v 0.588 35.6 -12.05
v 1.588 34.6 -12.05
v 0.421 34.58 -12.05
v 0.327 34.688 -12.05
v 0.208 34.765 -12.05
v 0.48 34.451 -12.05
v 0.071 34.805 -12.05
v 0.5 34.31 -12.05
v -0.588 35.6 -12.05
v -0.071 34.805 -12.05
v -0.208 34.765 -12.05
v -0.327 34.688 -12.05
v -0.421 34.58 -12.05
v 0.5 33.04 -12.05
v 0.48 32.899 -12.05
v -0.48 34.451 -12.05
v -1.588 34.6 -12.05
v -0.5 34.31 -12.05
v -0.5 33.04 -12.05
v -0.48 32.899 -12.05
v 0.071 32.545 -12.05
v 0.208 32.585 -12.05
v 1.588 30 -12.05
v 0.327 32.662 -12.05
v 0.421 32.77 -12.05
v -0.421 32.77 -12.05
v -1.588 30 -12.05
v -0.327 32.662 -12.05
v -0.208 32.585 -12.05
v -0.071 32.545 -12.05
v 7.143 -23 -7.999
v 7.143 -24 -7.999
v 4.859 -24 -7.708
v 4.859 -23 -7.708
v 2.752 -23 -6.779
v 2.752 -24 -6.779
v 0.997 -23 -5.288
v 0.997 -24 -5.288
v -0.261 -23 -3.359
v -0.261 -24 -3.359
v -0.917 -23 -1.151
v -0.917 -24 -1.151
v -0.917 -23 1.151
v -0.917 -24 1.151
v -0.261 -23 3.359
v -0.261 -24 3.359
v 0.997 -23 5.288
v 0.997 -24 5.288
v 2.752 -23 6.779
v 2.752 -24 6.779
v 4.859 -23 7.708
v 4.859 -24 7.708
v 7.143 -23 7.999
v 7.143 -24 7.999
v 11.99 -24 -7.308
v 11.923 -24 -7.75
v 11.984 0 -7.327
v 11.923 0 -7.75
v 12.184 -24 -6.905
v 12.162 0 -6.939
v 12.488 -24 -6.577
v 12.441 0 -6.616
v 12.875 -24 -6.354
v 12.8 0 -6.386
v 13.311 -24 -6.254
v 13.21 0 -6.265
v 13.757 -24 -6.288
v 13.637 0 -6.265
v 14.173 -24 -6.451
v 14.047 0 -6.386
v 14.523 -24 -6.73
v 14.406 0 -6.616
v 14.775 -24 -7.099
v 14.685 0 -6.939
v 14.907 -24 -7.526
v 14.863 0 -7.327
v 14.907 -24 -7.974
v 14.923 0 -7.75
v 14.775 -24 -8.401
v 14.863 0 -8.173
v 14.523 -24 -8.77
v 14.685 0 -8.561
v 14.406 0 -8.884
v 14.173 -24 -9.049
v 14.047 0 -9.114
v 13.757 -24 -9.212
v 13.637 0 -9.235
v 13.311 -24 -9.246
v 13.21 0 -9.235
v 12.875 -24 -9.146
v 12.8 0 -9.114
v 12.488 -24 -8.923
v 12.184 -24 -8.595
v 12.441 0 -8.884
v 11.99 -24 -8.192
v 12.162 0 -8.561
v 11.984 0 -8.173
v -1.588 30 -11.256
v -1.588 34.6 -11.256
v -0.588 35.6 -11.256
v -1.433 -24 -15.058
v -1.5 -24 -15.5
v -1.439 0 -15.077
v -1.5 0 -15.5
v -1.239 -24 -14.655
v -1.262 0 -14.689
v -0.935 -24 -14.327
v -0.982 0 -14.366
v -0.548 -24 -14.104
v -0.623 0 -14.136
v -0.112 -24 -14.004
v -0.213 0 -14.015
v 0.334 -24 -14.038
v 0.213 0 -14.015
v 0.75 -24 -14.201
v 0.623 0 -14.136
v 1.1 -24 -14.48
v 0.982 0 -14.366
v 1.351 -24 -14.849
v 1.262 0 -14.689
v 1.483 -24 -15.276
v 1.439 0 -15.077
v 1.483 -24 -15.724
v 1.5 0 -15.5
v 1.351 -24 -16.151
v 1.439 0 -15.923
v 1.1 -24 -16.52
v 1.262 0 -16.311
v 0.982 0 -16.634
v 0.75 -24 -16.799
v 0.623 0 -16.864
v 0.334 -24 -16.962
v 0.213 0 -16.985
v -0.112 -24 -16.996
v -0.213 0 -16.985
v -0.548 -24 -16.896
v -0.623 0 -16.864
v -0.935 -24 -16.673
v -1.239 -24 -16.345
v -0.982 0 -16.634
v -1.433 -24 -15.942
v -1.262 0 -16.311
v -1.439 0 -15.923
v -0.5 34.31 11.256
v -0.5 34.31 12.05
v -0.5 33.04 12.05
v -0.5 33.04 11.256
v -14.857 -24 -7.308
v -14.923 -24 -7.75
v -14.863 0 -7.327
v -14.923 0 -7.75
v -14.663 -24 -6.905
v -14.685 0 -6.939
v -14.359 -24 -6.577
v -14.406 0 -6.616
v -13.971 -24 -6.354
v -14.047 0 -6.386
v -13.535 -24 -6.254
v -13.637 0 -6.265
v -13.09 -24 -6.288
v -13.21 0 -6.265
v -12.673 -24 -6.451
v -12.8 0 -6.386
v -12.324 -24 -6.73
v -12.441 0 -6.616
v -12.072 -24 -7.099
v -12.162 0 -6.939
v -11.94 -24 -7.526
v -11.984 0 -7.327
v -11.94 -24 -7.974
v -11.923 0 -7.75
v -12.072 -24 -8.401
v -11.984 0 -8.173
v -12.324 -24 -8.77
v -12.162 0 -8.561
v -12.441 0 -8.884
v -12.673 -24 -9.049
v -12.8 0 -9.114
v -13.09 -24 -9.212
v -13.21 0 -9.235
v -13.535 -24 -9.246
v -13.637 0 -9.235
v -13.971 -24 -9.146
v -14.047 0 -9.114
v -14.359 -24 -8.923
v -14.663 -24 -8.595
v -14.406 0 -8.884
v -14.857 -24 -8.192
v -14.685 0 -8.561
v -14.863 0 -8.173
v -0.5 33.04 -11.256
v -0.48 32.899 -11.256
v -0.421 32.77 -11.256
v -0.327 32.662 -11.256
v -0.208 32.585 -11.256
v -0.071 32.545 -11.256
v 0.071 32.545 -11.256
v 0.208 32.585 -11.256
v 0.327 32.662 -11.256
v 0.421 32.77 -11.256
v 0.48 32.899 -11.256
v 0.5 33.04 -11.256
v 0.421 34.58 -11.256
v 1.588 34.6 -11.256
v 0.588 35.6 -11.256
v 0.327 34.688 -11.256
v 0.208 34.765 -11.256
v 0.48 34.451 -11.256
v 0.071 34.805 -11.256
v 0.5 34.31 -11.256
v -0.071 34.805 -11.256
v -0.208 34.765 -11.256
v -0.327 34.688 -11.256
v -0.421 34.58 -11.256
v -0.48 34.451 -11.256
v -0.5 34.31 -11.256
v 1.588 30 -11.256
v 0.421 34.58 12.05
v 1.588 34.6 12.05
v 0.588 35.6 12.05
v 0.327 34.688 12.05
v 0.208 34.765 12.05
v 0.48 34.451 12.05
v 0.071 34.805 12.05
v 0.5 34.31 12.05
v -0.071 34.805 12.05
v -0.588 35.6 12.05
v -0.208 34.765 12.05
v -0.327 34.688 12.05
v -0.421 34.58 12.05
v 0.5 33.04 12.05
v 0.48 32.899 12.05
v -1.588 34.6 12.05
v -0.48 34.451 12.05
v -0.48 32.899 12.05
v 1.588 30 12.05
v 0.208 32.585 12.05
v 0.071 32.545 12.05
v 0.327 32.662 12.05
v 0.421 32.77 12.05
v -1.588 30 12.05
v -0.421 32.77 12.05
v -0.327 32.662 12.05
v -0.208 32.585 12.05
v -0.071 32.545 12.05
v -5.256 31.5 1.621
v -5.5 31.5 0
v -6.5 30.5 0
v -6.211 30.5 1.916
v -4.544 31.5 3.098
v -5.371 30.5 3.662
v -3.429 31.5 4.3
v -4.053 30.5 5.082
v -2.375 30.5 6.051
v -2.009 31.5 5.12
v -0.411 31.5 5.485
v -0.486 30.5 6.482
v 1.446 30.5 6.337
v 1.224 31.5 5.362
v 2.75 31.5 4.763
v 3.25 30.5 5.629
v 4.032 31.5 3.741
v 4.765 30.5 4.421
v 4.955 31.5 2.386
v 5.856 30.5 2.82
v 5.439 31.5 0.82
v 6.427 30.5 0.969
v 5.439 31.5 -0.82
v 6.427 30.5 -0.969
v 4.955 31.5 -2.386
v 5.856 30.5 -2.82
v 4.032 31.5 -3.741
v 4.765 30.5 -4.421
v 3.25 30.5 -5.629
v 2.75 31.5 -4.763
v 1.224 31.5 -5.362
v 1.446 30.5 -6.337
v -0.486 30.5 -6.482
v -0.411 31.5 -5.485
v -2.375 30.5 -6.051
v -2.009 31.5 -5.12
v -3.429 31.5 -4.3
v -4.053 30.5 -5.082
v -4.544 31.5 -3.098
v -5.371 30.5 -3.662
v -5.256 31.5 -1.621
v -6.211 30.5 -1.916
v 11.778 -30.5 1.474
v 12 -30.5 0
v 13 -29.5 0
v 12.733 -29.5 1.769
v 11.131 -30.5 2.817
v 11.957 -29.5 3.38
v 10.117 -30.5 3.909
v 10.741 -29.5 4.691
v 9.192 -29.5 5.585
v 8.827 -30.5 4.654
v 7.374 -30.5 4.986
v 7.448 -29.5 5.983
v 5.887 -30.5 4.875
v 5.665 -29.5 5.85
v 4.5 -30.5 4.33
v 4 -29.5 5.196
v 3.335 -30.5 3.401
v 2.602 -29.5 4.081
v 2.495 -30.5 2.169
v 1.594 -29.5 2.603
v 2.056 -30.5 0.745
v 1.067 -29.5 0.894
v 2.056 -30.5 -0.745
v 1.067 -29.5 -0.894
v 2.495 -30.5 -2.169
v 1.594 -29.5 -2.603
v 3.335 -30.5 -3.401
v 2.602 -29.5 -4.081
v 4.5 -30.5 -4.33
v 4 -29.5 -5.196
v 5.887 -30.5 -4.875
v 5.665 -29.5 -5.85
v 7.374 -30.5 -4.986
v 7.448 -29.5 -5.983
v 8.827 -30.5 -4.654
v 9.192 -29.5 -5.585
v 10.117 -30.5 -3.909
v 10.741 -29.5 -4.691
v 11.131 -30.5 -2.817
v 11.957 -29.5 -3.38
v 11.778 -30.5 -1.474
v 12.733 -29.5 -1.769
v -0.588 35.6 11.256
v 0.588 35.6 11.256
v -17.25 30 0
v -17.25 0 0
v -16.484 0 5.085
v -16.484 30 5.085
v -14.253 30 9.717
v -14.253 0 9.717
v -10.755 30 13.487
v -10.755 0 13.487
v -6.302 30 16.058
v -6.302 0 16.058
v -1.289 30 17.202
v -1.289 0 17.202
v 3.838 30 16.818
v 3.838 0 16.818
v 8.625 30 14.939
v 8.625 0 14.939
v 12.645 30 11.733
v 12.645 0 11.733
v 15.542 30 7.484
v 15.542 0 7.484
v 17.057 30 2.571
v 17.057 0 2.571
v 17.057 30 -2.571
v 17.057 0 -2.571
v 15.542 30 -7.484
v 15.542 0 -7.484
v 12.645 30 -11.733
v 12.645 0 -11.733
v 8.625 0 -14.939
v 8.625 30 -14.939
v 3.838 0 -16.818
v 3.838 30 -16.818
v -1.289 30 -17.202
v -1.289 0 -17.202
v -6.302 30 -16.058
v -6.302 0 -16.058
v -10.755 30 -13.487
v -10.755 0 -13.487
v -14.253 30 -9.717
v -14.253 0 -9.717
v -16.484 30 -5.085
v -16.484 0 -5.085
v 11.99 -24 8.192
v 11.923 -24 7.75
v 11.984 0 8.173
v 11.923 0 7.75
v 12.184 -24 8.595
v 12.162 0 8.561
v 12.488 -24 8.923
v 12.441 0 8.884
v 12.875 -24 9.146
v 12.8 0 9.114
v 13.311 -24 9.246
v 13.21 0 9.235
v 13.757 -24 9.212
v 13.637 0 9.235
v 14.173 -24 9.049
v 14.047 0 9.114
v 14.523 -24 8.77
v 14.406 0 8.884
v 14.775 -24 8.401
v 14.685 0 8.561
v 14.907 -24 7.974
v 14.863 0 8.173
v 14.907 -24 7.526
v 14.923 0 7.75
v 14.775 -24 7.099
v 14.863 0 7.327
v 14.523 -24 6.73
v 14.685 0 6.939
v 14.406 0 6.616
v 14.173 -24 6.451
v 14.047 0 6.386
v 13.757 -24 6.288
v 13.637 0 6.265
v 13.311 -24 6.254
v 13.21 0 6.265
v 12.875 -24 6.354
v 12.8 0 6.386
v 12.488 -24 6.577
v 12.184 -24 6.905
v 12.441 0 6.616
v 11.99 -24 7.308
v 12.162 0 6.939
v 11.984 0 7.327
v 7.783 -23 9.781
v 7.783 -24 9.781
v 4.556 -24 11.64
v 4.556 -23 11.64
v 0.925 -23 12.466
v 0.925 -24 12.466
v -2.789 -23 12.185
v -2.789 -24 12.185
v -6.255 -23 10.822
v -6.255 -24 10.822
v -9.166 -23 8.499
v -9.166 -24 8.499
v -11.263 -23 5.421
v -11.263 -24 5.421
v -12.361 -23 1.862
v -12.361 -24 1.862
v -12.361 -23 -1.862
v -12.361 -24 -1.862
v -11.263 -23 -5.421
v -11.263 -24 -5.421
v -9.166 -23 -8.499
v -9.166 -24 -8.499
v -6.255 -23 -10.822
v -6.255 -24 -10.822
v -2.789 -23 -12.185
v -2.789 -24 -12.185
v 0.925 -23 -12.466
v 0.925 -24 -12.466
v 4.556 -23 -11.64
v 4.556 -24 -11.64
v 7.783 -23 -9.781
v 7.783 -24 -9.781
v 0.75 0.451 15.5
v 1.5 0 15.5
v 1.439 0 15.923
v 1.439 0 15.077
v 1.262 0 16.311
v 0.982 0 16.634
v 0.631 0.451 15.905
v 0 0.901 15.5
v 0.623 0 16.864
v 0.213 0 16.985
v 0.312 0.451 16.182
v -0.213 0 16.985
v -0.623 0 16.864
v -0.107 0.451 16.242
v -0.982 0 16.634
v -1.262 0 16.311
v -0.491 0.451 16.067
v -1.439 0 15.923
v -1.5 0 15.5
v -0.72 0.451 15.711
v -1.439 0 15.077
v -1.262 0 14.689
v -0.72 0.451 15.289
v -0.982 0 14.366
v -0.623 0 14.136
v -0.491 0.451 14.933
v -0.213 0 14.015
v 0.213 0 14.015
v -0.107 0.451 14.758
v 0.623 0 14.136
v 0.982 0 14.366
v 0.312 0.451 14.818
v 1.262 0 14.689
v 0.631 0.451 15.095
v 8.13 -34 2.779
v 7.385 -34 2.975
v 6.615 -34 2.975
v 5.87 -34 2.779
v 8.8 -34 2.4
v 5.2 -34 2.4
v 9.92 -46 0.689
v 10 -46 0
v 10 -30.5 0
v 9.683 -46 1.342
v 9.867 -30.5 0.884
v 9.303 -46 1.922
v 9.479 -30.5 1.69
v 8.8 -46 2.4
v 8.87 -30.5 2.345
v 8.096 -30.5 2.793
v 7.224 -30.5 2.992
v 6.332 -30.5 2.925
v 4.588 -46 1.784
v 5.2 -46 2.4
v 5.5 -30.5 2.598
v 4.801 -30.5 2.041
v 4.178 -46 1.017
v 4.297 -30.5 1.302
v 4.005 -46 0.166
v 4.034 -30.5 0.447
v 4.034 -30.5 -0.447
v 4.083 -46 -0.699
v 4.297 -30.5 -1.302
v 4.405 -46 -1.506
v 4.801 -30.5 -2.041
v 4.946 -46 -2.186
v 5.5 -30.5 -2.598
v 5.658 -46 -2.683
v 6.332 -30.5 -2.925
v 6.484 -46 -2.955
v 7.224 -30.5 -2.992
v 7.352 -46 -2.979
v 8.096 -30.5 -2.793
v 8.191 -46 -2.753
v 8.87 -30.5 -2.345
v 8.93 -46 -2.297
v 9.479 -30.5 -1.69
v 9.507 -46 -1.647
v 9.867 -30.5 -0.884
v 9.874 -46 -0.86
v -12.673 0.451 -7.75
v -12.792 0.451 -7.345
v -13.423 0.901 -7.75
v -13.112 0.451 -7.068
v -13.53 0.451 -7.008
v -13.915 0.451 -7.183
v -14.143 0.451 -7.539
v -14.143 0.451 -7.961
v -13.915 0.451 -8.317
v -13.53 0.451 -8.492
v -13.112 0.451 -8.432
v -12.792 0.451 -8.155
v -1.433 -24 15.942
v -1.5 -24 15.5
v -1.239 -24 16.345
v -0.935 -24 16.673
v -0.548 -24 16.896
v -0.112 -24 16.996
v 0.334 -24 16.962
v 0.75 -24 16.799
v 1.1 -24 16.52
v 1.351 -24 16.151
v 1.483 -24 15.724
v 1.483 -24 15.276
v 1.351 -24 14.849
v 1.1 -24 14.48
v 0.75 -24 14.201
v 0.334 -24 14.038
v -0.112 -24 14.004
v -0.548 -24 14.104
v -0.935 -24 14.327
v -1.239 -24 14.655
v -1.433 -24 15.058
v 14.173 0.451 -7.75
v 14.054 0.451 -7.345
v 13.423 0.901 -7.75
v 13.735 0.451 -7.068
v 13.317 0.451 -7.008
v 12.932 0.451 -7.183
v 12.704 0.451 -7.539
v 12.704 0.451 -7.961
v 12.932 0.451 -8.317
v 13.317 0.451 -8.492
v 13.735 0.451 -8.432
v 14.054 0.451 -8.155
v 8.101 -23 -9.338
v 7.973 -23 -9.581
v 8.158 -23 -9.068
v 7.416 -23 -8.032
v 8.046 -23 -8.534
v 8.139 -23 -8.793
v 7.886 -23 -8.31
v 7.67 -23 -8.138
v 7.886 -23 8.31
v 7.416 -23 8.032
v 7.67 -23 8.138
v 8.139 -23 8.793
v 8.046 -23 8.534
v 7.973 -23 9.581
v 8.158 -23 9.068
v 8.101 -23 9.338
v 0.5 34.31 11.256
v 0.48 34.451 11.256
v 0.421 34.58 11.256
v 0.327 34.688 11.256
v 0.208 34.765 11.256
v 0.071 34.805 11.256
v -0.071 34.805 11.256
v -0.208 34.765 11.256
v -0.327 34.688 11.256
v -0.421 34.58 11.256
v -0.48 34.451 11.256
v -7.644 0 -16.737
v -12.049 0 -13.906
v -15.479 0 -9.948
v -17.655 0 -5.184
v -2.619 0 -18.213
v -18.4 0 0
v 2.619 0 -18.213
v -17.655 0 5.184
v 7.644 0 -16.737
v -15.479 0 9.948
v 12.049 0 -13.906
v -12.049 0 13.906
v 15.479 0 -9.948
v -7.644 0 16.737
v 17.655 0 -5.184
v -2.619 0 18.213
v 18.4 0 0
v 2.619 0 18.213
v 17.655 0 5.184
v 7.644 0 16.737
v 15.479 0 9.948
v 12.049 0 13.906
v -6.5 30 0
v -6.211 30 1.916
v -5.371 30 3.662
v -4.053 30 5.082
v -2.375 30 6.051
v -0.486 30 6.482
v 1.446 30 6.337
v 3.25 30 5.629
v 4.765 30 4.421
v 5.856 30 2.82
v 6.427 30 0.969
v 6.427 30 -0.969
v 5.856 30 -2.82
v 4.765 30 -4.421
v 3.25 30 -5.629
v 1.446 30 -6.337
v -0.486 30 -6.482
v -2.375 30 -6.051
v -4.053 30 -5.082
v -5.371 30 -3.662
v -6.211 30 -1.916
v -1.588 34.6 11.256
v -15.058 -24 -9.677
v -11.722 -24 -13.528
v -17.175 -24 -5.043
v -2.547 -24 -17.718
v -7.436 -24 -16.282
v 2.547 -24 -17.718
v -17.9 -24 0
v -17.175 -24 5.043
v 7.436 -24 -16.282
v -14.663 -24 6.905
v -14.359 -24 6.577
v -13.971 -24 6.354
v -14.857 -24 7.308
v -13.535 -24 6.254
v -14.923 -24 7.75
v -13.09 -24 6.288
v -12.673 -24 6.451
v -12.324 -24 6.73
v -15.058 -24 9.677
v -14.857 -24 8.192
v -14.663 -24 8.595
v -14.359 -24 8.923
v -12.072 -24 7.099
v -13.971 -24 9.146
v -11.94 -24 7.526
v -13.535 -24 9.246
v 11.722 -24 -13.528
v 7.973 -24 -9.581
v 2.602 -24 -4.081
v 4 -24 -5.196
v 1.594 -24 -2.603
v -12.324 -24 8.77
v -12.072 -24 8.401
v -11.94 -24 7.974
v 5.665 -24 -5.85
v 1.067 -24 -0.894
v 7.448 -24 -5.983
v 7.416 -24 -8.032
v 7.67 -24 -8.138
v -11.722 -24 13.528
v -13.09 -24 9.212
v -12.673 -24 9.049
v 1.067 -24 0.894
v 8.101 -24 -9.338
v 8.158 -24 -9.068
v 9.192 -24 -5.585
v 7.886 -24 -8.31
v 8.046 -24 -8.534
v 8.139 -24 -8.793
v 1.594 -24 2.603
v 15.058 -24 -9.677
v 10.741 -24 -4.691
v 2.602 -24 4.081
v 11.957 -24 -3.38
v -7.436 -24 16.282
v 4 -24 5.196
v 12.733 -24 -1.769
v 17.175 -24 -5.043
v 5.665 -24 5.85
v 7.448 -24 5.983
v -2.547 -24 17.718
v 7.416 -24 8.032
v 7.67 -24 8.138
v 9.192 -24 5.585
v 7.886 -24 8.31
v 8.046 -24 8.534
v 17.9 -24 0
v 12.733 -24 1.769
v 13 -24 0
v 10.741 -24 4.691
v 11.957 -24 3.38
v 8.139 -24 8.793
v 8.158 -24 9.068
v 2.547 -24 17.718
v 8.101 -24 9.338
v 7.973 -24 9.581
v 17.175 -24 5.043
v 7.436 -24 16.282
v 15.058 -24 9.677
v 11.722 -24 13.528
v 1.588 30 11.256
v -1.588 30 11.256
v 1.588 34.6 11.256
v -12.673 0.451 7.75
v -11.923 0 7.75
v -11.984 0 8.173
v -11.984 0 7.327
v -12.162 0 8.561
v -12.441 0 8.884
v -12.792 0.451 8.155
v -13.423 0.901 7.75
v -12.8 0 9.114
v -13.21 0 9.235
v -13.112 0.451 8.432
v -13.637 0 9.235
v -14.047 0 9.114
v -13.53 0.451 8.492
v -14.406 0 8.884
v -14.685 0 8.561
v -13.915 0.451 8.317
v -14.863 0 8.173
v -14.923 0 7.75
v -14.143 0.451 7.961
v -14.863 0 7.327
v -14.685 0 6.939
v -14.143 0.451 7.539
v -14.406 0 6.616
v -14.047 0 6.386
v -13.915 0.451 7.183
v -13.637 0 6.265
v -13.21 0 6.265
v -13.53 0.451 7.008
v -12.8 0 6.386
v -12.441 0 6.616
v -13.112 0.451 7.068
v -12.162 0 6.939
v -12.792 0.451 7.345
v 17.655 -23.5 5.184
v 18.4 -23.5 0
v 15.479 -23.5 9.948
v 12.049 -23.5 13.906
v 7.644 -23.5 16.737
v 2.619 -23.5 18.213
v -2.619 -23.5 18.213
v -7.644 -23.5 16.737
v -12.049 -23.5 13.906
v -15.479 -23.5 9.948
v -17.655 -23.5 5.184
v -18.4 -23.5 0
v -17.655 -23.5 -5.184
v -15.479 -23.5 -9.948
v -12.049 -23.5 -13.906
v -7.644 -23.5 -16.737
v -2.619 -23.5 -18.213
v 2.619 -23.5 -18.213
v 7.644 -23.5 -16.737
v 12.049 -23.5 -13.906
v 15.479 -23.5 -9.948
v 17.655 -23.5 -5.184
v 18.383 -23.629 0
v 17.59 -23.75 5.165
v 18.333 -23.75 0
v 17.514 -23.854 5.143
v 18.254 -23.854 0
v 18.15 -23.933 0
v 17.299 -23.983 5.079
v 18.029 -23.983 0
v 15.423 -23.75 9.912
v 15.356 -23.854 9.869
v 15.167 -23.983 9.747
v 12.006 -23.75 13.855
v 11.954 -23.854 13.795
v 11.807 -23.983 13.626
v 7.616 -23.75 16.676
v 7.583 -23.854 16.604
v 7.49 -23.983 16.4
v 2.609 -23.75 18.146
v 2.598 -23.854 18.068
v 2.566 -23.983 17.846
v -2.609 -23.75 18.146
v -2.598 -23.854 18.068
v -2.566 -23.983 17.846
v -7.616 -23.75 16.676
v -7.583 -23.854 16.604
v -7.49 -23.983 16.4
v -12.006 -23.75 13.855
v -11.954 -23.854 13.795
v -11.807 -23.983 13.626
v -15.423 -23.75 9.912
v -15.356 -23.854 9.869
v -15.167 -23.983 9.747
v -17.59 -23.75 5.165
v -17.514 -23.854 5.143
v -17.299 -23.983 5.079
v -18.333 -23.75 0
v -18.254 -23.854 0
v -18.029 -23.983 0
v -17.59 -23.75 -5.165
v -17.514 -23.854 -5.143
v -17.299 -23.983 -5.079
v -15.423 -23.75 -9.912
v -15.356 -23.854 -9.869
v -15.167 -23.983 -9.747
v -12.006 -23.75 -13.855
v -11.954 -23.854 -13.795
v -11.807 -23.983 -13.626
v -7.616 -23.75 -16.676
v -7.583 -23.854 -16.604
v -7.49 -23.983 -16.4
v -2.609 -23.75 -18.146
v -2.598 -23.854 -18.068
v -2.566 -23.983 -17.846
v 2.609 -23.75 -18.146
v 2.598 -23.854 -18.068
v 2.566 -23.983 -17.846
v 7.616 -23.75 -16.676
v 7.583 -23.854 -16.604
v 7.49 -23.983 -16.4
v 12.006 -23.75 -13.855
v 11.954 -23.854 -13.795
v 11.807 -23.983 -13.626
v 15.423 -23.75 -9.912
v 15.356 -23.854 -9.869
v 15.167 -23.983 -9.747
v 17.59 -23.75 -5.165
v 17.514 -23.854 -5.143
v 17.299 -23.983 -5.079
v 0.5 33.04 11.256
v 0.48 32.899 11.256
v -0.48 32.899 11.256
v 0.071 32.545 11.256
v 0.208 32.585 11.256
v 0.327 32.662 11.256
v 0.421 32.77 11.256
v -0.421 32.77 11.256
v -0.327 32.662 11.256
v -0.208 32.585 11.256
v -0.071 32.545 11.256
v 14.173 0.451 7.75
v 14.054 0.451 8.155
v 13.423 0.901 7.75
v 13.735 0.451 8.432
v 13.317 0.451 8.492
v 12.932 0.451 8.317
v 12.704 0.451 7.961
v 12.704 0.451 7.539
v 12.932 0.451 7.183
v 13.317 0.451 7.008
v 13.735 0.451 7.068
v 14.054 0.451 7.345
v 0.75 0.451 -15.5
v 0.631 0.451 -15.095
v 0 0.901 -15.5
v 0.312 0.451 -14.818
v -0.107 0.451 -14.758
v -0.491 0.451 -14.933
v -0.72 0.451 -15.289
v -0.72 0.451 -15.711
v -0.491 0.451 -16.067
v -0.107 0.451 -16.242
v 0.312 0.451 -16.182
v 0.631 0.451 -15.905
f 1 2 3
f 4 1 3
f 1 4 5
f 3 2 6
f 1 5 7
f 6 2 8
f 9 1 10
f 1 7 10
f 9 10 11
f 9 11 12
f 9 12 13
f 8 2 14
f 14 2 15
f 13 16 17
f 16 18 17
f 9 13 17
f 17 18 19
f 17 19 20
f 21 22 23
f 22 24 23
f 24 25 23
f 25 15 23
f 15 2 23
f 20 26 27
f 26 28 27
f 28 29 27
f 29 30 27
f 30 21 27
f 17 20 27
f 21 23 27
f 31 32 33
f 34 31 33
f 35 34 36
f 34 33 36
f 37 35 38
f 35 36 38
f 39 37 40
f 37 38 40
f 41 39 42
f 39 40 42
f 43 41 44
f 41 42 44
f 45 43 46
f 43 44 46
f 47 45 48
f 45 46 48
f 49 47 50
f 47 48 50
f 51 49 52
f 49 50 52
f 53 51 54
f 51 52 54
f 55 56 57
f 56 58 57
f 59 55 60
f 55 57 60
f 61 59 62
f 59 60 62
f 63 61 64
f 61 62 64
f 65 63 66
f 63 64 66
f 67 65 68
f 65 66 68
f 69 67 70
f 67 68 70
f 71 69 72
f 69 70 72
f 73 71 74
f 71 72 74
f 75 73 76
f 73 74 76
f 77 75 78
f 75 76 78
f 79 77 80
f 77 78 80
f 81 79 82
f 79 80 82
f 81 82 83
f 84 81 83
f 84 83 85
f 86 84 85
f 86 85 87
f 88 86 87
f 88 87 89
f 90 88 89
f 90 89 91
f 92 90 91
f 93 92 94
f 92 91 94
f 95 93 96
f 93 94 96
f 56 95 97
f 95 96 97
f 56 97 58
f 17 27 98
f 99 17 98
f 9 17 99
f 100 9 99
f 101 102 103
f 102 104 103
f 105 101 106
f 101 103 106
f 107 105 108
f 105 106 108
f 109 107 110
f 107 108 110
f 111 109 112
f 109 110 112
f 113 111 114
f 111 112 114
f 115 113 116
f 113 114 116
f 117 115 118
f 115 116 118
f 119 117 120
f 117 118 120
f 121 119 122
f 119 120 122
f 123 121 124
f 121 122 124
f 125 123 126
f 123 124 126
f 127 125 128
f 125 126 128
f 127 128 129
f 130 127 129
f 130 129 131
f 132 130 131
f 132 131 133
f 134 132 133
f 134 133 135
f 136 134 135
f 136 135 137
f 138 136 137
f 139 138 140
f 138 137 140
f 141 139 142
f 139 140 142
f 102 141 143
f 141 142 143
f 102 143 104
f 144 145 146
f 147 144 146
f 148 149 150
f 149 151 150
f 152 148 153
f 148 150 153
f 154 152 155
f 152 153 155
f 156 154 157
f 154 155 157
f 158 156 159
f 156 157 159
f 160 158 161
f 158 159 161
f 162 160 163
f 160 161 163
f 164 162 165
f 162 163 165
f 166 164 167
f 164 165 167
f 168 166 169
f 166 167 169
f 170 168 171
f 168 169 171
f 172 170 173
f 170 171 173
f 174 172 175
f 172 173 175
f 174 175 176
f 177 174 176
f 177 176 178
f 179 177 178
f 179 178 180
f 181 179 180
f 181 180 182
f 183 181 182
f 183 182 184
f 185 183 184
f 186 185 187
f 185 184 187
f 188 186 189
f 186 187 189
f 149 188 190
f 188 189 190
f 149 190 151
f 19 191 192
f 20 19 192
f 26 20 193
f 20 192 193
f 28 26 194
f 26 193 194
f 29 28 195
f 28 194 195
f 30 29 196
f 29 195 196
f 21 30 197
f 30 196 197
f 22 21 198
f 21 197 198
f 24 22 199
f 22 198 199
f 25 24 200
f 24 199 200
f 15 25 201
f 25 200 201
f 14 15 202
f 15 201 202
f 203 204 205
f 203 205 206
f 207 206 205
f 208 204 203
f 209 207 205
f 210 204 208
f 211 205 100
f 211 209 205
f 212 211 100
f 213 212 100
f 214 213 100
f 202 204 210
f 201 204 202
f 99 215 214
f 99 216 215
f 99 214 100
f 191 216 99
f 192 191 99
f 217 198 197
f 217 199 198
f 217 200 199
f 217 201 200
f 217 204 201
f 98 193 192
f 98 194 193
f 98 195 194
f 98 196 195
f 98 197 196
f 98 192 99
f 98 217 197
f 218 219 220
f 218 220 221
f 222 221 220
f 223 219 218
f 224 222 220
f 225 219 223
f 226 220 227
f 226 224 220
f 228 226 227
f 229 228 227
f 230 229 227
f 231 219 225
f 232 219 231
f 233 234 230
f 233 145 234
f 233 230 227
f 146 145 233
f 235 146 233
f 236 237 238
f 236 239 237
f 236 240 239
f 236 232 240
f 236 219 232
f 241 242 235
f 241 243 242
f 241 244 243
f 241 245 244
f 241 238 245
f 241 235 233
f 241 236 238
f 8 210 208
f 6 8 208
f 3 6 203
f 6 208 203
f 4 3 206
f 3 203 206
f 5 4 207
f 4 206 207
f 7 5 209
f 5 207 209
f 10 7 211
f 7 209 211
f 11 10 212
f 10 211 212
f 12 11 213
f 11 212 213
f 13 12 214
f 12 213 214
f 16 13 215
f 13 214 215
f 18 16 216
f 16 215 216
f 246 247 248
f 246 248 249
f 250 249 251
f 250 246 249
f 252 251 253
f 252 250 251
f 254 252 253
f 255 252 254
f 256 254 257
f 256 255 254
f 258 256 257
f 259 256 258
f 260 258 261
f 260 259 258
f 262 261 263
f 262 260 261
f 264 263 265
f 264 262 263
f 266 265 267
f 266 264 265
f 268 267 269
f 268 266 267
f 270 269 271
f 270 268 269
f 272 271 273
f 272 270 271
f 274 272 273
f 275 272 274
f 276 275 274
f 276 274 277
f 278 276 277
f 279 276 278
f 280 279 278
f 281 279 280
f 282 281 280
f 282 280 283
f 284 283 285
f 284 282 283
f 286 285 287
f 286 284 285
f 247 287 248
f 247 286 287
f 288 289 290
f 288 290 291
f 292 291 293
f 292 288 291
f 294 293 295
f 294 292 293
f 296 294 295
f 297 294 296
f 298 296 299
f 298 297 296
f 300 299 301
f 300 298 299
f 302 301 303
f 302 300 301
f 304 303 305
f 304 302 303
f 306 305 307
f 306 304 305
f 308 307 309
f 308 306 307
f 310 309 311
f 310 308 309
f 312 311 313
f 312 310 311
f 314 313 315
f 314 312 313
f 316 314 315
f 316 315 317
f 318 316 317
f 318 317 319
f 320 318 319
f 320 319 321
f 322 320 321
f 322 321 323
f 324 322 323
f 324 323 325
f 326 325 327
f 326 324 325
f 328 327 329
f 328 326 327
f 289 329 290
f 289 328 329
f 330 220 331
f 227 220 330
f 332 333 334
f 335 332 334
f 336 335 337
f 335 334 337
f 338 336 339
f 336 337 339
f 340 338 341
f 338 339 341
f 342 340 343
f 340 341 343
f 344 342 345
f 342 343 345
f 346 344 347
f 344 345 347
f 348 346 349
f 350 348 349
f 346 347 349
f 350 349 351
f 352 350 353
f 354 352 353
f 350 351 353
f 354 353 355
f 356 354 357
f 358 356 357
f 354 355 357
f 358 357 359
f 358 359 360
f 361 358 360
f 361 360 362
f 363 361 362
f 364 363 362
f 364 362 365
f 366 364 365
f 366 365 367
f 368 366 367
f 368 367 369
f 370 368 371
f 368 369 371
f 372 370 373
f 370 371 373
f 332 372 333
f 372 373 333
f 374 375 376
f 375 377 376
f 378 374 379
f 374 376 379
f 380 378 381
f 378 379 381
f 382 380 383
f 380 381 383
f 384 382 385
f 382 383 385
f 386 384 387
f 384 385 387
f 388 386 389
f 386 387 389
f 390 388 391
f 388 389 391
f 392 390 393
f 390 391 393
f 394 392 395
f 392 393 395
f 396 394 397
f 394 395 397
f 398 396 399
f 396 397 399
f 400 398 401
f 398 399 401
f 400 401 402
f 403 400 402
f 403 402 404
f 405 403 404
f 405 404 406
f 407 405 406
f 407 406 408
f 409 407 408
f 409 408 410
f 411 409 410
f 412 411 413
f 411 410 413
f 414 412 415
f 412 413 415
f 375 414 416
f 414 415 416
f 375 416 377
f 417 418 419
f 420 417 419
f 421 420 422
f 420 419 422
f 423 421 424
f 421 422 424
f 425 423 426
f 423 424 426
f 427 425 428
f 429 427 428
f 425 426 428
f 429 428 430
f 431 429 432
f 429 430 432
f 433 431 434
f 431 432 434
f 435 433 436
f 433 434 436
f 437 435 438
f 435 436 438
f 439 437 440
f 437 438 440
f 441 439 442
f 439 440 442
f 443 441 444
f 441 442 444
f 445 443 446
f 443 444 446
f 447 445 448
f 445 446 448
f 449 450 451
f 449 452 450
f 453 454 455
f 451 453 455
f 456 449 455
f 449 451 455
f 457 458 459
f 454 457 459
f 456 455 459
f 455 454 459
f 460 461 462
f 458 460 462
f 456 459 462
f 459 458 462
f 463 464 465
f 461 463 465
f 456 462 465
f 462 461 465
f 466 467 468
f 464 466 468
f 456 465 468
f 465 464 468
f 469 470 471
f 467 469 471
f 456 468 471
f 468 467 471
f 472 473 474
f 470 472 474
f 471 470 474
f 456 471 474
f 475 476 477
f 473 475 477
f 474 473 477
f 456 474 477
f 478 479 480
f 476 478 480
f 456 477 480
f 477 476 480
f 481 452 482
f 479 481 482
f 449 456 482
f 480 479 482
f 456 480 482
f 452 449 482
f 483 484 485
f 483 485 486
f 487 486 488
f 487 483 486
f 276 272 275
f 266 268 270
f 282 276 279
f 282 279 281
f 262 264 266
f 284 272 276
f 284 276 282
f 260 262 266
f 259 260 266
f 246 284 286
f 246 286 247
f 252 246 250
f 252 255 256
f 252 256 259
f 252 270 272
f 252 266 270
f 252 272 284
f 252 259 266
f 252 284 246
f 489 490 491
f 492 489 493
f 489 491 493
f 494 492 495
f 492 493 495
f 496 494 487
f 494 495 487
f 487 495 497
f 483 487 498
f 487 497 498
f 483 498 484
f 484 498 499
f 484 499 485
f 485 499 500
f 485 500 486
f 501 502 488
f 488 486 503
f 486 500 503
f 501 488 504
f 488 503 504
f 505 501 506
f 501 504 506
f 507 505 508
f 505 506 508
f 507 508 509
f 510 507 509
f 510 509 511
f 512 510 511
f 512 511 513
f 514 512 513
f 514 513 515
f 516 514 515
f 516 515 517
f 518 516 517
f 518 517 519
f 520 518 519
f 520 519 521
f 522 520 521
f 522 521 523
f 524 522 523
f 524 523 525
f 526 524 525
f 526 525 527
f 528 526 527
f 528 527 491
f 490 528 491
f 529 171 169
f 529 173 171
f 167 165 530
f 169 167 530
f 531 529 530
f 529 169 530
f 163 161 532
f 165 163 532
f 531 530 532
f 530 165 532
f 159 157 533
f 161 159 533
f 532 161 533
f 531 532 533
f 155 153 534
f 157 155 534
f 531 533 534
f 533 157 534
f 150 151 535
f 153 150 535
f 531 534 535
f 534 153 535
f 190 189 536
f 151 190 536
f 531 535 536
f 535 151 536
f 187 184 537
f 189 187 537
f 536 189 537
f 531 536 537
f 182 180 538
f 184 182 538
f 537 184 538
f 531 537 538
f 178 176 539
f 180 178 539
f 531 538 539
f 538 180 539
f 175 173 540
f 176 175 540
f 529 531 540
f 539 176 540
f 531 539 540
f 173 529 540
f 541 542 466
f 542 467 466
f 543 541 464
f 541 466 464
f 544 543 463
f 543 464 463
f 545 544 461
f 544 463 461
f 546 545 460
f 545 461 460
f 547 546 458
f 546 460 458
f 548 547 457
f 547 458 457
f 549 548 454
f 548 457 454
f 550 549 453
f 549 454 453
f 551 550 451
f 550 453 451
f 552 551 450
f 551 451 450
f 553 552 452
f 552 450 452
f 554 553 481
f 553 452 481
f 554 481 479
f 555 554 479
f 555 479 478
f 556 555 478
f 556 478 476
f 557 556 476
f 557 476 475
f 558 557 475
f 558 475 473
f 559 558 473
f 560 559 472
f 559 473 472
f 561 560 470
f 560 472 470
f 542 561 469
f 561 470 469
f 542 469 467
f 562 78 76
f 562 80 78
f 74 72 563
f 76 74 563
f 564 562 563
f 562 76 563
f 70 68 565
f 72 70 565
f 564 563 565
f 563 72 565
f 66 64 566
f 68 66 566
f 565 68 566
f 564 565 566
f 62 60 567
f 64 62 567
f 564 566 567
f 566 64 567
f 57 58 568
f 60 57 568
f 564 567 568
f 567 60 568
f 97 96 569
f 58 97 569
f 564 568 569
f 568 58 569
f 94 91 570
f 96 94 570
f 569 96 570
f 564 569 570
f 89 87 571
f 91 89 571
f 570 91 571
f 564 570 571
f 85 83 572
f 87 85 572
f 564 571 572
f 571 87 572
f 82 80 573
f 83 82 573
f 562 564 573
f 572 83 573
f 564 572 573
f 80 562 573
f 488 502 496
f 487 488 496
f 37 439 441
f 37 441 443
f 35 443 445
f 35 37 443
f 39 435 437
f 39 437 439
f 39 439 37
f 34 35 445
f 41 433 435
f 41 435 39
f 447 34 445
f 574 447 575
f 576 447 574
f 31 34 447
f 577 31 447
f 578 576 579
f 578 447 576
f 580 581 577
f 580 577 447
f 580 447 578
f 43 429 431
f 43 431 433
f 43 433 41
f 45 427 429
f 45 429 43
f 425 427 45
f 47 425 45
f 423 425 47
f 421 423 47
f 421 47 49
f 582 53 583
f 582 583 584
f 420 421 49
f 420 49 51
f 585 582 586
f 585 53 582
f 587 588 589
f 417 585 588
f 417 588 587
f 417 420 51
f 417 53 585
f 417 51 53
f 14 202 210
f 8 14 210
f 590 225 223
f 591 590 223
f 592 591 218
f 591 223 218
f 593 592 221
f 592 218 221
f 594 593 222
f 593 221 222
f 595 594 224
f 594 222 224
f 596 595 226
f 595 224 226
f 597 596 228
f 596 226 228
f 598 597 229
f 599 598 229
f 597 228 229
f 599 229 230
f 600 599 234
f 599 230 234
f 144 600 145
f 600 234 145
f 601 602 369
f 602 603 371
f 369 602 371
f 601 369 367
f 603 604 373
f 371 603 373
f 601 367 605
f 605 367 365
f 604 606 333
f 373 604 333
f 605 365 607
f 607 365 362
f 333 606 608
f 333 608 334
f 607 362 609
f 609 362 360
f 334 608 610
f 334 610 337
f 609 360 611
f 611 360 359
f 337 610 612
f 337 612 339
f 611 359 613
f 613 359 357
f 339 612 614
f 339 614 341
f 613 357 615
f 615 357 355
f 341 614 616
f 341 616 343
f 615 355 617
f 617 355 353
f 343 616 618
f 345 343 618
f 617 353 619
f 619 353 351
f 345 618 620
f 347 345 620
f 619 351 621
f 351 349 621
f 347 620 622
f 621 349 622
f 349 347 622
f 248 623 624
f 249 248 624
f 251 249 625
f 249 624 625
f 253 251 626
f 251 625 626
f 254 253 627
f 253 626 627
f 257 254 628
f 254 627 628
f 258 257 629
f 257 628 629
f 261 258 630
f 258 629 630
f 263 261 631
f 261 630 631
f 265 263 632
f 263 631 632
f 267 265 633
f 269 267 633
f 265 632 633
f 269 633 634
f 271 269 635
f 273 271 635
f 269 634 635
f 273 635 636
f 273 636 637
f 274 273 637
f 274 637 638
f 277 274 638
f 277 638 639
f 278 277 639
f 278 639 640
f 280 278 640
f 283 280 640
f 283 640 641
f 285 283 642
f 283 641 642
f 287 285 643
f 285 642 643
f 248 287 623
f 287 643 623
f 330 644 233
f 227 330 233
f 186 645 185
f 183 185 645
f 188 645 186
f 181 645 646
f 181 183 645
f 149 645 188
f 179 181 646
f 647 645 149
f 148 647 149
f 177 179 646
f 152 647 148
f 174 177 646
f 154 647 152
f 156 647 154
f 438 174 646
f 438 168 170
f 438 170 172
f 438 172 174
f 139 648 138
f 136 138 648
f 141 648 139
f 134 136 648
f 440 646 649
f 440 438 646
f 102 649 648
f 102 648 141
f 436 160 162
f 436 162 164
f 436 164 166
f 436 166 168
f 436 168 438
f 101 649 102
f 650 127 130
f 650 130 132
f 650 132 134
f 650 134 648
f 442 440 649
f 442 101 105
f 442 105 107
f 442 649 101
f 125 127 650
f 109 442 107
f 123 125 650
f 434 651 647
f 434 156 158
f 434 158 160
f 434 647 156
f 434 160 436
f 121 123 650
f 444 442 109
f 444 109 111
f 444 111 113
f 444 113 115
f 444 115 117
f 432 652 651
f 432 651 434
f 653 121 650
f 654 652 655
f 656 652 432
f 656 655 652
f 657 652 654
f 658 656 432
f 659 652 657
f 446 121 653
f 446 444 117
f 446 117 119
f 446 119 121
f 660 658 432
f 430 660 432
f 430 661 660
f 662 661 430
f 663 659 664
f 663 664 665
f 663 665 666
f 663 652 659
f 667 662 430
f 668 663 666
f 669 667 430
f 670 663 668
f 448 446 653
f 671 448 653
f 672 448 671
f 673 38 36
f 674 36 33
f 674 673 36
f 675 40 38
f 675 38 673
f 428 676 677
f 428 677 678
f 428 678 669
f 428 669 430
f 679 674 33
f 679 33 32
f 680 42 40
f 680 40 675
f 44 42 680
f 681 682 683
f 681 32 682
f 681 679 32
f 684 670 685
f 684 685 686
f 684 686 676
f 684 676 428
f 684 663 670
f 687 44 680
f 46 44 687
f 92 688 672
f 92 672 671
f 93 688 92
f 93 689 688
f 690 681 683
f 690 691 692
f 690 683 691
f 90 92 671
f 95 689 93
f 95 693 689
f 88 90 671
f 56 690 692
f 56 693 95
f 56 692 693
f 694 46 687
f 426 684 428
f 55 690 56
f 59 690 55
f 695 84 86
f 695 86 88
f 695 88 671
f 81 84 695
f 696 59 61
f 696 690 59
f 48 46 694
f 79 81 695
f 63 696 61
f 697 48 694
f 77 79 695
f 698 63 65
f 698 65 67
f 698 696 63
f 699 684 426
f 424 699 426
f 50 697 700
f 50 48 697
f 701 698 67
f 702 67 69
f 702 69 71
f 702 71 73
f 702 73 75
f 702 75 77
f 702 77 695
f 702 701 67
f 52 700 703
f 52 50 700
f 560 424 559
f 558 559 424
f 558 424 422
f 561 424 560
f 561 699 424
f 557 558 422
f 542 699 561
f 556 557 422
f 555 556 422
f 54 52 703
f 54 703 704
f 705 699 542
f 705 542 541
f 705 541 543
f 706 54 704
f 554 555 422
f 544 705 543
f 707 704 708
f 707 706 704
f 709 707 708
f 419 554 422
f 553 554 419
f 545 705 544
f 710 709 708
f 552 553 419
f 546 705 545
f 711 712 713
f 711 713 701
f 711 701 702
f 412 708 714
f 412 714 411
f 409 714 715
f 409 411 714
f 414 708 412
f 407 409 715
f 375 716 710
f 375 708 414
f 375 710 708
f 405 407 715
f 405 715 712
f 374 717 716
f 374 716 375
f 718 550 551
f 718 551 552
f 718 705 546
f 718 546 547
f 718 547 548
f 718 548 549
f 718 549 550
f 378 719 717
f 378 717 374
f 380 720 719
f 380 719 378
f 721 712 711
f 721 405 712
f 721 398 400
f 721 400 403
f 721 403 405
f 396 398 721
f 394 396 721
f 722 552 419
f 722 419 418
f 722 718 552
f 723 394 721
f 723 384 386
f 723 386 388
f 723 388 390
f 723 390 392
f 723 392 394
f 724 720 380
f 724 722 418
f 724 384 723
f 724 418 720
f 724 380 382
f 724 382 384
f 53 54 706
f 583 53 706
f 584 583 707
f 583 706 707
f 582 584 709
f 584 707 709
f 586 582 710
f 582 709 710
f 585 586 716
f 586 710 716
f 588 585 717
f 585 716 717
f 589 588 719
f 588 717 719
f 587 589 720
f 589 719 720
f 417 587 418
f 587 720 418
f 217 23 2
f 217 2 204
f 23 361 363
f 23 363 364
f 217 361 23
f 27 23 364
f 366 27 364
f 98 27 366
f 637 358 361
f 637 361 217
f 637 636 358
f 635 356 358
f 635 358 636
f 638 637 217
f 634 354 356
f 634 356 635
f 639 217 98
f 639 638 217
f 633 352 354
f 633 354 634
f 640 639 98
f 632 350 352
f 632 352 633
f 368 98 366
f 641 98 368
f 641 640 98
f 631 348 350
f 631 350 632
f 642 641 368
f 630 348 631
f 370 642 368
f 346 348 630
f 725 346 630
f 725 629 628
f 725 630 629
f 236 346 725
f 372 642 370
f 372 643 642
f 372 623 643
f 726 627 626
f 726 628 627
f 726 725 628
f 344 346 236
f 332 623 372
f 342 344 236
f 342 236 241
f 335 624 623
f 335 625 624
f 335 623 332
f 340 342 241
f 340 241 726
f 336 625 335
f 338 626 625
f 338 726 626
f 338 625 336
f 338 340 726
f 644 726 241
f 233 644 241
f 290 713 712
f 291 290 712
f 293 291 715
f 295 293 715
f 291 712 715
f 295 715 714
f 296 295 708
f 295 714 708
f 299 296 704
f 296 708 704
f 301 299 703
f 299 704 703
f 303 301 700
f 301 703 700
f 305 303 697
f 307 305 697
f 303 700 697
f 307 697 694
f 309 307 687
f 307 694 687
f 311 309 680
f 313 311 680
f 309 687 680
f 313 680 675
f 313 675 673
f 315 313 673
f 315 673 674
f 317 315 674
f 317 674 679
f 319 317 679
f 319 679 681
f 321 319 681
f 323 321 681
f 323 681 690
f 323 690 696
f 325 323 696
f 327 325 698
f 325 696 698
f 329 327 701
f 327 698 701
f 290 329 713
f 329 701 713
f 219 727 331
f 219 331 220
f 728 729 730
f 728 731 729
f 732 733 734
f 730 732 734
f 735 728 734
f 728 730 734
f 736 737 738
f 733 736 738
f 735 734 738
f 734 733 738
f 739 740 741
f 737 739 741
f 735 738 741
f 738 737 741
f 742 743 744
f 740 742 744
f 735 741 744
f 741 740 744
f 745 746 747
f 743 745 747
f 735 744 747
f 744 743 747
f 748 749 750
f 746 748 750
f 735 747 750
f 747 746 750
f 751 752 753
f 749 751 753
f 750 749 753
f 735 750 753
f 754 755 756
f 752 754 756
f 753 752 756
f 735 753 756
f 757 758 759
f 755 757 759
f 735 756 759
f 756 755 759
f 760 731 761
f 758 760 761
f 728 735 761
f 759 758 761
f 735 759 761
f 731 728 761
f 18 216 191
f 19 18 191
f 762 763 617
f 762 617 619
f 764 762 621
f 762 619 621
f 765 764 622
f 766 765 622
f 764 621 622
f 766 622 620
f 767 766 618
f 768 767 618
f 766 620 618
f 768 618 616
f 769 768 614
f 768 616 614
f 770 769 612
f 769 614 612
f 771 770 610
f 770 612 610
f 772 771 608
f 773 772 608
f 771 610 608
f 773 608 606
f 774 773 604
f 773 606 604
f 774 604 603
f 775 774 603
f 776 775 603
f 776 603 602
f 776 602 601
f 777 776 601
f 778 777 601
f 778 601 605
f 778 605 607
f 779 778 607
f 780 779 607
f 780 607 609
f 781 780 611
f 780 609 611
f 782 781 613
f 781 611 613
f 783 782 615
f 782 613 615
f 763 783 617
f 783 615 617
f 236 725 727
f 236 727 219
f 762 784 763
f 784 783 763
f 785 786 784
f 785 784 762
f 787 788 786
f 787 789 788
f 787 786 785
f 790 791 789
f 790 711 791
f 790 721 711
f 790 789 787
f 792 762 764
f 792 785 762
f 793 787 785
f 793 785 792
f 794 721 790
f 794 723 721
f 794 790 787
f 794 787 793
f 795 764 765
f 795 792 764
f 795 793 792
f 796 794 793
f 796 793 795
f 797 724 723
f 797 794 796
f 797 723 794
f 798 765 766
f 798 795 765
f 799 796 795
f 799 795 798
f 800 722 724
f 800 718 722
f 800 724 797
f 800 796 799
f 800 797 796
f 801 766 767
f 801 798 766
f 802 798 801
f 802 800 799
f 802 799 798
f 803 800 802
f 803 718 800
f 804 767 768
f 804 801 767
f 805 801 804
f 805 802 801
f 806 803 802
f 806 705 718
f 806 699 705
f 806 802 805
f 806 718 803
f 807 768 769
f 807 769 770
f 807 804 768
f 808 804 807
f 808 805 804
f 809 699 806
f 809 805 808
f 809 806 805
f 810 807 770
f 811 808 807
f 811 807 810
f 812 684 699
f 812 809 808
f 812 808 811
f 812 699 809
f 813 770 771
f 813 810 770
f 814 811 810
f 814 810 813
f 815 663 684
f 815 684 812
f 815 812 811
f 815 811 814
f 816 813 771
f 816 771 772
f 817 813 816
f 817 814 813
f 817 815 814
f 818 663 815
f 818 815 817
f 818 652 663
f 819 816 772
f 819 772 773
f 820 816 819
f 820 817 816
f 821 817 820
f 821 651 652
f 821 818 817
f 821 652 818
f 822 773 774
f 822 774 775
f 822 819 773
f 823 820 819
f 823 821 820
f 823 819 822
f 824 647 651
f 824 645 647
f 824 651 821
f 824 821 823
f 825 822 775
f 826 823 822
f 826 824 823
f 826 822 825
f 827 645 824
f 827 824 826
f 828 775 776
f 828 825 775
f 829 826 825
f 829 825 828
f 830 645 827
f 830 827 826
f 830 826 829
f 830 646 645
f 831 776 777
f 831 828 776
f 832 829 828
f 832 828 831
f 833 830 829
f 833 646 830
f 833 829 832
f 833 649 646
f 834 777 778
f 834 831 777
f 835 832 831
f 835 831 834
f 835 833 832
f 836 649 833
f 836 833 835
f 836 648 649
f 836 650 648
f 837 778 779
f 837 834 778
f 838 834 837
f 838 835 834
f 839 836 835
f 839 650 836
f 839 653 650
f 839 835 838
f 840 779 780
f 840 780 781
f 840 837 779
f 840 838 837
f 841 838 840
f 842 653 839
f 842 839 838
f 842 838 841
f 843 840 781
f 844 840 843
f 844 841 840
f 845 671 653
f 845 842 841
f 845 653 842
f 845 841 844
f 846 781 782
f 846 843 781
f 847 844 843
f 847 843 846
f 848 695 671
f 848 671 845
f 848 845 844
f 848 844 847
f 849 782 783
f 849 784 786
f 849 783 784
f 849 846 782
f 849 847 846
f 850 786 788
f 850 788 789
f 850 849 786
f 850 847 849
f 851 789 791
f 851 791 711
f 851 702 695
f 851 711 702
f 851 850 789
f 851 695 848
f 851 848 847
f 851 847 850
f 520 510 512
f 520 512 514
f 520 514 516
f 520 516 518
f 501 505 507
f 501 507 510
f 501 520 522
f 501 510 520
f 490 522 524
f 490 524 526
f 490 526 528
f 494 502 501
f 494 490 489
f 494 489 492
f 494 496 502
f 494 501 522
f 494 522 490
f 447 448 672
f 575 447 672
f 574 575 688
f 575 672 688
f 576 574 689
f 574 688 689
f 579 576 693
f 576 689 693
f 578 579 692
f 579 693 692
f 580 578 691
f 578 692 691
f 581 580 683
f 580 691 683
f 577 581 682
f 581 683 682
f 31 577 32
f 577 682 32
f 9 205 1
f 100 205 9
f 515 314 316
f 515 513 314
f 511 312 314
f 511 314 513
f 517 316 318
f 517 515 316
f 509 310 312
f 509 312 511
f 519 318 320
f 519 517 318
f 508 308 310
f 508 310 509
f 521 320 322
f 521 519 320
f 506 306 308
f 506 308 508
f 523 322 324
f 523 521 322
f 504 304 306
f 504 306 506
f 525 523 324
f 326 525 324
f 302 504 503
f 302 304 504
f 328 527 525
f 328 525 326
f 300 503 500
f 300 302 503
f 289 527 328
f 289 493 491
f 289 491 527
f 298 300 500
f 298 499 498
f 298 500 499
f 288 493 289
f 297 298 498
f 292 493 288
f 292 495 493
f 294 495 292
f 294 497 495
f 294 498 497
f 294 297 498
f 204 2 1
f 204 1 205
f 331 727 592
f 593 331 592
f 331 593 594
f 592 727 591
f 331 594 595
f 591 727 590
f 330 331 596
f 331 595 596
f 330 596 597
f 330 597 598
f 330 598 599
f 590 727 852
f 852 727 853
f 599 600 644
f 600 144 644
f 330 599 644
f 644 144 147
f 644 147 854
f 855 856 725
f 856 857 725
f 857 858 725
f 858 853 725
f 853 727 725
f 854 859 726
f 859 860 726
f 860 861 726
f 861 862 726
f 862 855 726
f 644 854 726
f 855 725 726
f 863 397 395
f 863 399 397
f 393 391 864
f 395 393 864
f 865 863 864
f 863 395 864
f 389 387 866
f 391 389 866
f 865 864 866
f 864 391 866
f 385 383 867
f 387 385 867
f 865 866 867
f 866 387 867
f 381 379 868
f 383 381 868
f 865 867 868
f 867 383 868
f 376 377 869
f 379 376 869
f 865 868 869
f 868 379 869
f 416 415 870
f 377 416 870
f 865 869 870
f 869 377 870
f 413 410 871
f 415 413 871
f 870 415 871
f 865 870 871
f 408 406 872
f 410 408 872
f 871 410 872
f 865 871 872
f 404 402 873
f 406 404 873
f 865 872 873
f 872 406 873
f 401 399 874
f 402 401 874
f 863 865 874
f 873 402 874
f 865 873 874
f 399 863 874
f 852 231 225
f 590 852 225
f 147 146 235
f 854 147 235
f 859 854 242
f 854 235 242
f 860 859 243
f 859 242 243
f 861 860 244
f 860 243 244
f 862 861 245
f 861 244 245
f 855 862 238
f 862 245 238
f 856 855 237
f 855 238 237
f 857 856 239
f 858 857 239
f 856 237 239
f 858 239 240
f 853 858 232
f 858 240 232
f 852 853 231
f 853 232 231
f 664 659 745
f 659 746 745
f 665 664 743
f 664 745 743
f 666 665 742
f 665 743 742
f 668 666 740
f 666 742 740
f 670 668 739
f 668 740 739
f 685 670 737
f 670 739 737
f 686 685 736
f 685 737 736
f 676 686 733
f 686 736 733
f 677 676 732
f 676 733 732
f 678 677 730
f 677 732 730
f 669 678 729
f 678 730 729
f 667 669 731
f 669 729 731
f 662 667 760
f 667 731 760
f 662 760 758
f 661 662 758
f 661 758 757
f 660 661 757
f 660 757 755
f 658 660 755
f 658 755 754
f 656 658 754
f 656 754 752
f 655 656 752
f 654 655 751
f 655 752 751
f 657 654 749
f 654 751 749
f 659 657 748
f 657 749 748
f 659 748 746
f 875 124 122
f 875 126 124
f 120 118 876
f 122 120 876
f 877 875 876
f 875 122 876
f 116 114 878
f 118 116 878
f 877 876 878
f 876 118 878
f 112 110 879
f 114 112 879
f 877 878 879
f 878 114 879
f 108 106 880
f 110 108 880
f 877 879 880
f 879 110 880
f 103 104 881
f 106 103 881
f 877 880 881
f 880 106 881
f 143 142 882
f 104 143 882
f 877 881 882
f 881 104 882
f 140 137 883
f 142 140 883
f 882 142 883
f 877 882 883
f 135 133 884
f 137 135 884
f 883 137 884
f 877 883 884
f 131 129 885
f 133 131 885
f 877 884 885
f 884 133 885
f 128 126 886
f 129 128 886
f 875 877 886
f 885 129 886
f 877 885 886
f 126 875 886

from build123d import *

# Parameters (mm, degrees)
F0_R      = 18.4
F1_DEPTH  = 24
F2_R      = 17.25
F3_DEPTH  = 30
F4_R      = 6
F5_DEPTH  = 6.5
F6_R      = 3
F7_DEPTH  = 15.5
F8_SIZE   = 1
F10_DEPTH = 12
F12_D     = 3
F12_DEPTH = 24
F12_TIP   = 0.9012909285
F14_DEPTH = 1
F15_R     = 6.5
F16_DEPTH = 1.5
F17_SIZE  = 1
F18_W     = 3.175
F18_H     = 0.79375
F19_DEPTH = 5.6
F20_SIZE  = 1
F22_DEPTH = 25.4
F23_R     = 0.5


with BuildPart() as f1:
    # F0 (on Front) → F1 (new body)
    with BuildSketch(Plane.XZ):
        Circle(F0_R)
    extrude(amount=F1_DEPTH)

    # F2 (on face) → F3 (join)
    with BuildSketch(Plane(origin=(0, 0, 0), x_dir=(-1, 0, 0), z_dir=(0, 1, 0))):
        Circle(F2_R)
    extrude(amount=F3_DEPTH)

    # F4 (on face) → F5 (join)
    with BuildSketch(Plane.XZ.offset(24)):
        with Locations((7, 0)):
            Circle(F4_R)
    extrude(amount=F5_DEPTH)

    # F6 (on face) → F7 (join)
    with BuildSketch(Plane.XZ.offset(30.5)):
        with Locations((7, 0)):
            Circle(F6_R)
    extrude(amount=F7_DEPTH)

    # F8
    f8_edges = [f1.edges().sort_by_distance(p)[0] for p in [
        (1, -30.5, 0),
    ]]
    chamfer(f8_edges, length=F8_SIZE)

    # F9 (on face) → F10 (cut)
    with BuildSketch(Plane.XZ.offset(46)):
        with BuildLine():
            ThreePointArc((8.8, 2.4), (7, 3), (5.2, 2.4))
            Line((5.2, 2.4), (8.8, 2.4))
        make_face()
    extrude(amount=-F10_DEPTH, mode=Mode.SUBTRACT)

    # F12
    with Locations(Plane.XZ.offset(24)):
        with Locations((0, 15.5), (-13.4233937587, 7.75), (-13.4233937587, -7.75), (0, -15.5), (13.4233937587, -7.75), (13.4233937587, 7.75)):
            Hole(F12_D / 2, depth=F12_DEPTH)
            with Locations((0, 0, -(F12_DEPTH + F12_TIP / 2))):  # 118° drill point
                Cone(0, F12_D / 2, F12_TIP, mode=Mode.SUBTRACT)

    # F13 (on face) → F14 (cut)
    with BuildSketch(Plane.XZ.offset(24)):
        with BuildLine():
            ThreePointArc((7.1428571429, 7.9987243881), (8.1017881451, 8.6603638261), (7.7833850932, 9.7810488441))
            ThreePointArc((7.7833850932, 9.7810488441), (-12.5, 0), (7.7833850932, -9.7810488441))
            ThreePointArc((7.7833850932, -9.7810488441), (8.1017881451, -8.6603638261), (7.1428571429, -7.9987243881))
            ThreePointArc((7.1428571429, -7.9987243881), (-1, 0), (7.1428571429, 7.9987243881))
        make_face()
    extrude(amount=-F14_DEPTH, mode=Mode.SUBTRACT)

    # F15 (on face) → F16 (join)
    with BuildSketch(Plane(origin=(0, 30, 0), x_dir=(-1, 0, 0), z_dir=(0, 1, 0))):
        Circle(F15_R)
    extrude(amount=F16_DEPTH)

    # F17
    f17_edges = [f1.edges().sort_by_distance(p)[0] for p in [
        (6.5, 31.5, 0),
    ]]
    chamfer(f17_edges, length=F17_SIZE)

    # F18 (on face) → F19 (join)
    with BuildSketch(Plane(origin=(0, 30, 0), x_dir=(-1, 0, 0), z_dir=(0, 1, 0))):
        with Locations((0, 11.653125)):
            Rectangle(F18_W, F18_H)
        with Locations((0, -11.653125)):
            Rectangle(F18_W, F18_H)
    extrude(amount=F19_DEPTH)

    # F20
    f20_edges = [f1.edges().sort_by_distance(p)[0] for p in [
        (-1.5875, 35.6, 11.653125),
        (1.5875, 35.6, 11.653125),
        (1.5875, 35.6, -11.653125),
        (-1.5875, 35.6, -11.653125),
    ]]
    chamfer(f20_edges, length=F20_SIZE)

    # F21 (on face) → F22 (cut)
    with BuildSketch(Plane.XY.offset(12.05)):
        with BuildLine():
            Line((0.5, 33.04), (0.5, 34.31))
            ThreePointArc((0.5, 34.31), (0, 34.81), (-0.5, 34.31))
            Line((-0.5, 34.31), (-0.5, 33.04))
            ThreePointArc((-0.5, 33.04), (0, 32.54), (0.5, 33.04))
        make_face()
    extrude(amount=-F22_DEPTH, mode=Mode.SUBTRACT)

    # F23
    f23_edges = [f1.edges().sort_by_distance(p)[0] for p in [
        (-18.4, -24, 0),
    ]]
    fillet(f23_edges, radius=F23_R)


solid = f1.part
